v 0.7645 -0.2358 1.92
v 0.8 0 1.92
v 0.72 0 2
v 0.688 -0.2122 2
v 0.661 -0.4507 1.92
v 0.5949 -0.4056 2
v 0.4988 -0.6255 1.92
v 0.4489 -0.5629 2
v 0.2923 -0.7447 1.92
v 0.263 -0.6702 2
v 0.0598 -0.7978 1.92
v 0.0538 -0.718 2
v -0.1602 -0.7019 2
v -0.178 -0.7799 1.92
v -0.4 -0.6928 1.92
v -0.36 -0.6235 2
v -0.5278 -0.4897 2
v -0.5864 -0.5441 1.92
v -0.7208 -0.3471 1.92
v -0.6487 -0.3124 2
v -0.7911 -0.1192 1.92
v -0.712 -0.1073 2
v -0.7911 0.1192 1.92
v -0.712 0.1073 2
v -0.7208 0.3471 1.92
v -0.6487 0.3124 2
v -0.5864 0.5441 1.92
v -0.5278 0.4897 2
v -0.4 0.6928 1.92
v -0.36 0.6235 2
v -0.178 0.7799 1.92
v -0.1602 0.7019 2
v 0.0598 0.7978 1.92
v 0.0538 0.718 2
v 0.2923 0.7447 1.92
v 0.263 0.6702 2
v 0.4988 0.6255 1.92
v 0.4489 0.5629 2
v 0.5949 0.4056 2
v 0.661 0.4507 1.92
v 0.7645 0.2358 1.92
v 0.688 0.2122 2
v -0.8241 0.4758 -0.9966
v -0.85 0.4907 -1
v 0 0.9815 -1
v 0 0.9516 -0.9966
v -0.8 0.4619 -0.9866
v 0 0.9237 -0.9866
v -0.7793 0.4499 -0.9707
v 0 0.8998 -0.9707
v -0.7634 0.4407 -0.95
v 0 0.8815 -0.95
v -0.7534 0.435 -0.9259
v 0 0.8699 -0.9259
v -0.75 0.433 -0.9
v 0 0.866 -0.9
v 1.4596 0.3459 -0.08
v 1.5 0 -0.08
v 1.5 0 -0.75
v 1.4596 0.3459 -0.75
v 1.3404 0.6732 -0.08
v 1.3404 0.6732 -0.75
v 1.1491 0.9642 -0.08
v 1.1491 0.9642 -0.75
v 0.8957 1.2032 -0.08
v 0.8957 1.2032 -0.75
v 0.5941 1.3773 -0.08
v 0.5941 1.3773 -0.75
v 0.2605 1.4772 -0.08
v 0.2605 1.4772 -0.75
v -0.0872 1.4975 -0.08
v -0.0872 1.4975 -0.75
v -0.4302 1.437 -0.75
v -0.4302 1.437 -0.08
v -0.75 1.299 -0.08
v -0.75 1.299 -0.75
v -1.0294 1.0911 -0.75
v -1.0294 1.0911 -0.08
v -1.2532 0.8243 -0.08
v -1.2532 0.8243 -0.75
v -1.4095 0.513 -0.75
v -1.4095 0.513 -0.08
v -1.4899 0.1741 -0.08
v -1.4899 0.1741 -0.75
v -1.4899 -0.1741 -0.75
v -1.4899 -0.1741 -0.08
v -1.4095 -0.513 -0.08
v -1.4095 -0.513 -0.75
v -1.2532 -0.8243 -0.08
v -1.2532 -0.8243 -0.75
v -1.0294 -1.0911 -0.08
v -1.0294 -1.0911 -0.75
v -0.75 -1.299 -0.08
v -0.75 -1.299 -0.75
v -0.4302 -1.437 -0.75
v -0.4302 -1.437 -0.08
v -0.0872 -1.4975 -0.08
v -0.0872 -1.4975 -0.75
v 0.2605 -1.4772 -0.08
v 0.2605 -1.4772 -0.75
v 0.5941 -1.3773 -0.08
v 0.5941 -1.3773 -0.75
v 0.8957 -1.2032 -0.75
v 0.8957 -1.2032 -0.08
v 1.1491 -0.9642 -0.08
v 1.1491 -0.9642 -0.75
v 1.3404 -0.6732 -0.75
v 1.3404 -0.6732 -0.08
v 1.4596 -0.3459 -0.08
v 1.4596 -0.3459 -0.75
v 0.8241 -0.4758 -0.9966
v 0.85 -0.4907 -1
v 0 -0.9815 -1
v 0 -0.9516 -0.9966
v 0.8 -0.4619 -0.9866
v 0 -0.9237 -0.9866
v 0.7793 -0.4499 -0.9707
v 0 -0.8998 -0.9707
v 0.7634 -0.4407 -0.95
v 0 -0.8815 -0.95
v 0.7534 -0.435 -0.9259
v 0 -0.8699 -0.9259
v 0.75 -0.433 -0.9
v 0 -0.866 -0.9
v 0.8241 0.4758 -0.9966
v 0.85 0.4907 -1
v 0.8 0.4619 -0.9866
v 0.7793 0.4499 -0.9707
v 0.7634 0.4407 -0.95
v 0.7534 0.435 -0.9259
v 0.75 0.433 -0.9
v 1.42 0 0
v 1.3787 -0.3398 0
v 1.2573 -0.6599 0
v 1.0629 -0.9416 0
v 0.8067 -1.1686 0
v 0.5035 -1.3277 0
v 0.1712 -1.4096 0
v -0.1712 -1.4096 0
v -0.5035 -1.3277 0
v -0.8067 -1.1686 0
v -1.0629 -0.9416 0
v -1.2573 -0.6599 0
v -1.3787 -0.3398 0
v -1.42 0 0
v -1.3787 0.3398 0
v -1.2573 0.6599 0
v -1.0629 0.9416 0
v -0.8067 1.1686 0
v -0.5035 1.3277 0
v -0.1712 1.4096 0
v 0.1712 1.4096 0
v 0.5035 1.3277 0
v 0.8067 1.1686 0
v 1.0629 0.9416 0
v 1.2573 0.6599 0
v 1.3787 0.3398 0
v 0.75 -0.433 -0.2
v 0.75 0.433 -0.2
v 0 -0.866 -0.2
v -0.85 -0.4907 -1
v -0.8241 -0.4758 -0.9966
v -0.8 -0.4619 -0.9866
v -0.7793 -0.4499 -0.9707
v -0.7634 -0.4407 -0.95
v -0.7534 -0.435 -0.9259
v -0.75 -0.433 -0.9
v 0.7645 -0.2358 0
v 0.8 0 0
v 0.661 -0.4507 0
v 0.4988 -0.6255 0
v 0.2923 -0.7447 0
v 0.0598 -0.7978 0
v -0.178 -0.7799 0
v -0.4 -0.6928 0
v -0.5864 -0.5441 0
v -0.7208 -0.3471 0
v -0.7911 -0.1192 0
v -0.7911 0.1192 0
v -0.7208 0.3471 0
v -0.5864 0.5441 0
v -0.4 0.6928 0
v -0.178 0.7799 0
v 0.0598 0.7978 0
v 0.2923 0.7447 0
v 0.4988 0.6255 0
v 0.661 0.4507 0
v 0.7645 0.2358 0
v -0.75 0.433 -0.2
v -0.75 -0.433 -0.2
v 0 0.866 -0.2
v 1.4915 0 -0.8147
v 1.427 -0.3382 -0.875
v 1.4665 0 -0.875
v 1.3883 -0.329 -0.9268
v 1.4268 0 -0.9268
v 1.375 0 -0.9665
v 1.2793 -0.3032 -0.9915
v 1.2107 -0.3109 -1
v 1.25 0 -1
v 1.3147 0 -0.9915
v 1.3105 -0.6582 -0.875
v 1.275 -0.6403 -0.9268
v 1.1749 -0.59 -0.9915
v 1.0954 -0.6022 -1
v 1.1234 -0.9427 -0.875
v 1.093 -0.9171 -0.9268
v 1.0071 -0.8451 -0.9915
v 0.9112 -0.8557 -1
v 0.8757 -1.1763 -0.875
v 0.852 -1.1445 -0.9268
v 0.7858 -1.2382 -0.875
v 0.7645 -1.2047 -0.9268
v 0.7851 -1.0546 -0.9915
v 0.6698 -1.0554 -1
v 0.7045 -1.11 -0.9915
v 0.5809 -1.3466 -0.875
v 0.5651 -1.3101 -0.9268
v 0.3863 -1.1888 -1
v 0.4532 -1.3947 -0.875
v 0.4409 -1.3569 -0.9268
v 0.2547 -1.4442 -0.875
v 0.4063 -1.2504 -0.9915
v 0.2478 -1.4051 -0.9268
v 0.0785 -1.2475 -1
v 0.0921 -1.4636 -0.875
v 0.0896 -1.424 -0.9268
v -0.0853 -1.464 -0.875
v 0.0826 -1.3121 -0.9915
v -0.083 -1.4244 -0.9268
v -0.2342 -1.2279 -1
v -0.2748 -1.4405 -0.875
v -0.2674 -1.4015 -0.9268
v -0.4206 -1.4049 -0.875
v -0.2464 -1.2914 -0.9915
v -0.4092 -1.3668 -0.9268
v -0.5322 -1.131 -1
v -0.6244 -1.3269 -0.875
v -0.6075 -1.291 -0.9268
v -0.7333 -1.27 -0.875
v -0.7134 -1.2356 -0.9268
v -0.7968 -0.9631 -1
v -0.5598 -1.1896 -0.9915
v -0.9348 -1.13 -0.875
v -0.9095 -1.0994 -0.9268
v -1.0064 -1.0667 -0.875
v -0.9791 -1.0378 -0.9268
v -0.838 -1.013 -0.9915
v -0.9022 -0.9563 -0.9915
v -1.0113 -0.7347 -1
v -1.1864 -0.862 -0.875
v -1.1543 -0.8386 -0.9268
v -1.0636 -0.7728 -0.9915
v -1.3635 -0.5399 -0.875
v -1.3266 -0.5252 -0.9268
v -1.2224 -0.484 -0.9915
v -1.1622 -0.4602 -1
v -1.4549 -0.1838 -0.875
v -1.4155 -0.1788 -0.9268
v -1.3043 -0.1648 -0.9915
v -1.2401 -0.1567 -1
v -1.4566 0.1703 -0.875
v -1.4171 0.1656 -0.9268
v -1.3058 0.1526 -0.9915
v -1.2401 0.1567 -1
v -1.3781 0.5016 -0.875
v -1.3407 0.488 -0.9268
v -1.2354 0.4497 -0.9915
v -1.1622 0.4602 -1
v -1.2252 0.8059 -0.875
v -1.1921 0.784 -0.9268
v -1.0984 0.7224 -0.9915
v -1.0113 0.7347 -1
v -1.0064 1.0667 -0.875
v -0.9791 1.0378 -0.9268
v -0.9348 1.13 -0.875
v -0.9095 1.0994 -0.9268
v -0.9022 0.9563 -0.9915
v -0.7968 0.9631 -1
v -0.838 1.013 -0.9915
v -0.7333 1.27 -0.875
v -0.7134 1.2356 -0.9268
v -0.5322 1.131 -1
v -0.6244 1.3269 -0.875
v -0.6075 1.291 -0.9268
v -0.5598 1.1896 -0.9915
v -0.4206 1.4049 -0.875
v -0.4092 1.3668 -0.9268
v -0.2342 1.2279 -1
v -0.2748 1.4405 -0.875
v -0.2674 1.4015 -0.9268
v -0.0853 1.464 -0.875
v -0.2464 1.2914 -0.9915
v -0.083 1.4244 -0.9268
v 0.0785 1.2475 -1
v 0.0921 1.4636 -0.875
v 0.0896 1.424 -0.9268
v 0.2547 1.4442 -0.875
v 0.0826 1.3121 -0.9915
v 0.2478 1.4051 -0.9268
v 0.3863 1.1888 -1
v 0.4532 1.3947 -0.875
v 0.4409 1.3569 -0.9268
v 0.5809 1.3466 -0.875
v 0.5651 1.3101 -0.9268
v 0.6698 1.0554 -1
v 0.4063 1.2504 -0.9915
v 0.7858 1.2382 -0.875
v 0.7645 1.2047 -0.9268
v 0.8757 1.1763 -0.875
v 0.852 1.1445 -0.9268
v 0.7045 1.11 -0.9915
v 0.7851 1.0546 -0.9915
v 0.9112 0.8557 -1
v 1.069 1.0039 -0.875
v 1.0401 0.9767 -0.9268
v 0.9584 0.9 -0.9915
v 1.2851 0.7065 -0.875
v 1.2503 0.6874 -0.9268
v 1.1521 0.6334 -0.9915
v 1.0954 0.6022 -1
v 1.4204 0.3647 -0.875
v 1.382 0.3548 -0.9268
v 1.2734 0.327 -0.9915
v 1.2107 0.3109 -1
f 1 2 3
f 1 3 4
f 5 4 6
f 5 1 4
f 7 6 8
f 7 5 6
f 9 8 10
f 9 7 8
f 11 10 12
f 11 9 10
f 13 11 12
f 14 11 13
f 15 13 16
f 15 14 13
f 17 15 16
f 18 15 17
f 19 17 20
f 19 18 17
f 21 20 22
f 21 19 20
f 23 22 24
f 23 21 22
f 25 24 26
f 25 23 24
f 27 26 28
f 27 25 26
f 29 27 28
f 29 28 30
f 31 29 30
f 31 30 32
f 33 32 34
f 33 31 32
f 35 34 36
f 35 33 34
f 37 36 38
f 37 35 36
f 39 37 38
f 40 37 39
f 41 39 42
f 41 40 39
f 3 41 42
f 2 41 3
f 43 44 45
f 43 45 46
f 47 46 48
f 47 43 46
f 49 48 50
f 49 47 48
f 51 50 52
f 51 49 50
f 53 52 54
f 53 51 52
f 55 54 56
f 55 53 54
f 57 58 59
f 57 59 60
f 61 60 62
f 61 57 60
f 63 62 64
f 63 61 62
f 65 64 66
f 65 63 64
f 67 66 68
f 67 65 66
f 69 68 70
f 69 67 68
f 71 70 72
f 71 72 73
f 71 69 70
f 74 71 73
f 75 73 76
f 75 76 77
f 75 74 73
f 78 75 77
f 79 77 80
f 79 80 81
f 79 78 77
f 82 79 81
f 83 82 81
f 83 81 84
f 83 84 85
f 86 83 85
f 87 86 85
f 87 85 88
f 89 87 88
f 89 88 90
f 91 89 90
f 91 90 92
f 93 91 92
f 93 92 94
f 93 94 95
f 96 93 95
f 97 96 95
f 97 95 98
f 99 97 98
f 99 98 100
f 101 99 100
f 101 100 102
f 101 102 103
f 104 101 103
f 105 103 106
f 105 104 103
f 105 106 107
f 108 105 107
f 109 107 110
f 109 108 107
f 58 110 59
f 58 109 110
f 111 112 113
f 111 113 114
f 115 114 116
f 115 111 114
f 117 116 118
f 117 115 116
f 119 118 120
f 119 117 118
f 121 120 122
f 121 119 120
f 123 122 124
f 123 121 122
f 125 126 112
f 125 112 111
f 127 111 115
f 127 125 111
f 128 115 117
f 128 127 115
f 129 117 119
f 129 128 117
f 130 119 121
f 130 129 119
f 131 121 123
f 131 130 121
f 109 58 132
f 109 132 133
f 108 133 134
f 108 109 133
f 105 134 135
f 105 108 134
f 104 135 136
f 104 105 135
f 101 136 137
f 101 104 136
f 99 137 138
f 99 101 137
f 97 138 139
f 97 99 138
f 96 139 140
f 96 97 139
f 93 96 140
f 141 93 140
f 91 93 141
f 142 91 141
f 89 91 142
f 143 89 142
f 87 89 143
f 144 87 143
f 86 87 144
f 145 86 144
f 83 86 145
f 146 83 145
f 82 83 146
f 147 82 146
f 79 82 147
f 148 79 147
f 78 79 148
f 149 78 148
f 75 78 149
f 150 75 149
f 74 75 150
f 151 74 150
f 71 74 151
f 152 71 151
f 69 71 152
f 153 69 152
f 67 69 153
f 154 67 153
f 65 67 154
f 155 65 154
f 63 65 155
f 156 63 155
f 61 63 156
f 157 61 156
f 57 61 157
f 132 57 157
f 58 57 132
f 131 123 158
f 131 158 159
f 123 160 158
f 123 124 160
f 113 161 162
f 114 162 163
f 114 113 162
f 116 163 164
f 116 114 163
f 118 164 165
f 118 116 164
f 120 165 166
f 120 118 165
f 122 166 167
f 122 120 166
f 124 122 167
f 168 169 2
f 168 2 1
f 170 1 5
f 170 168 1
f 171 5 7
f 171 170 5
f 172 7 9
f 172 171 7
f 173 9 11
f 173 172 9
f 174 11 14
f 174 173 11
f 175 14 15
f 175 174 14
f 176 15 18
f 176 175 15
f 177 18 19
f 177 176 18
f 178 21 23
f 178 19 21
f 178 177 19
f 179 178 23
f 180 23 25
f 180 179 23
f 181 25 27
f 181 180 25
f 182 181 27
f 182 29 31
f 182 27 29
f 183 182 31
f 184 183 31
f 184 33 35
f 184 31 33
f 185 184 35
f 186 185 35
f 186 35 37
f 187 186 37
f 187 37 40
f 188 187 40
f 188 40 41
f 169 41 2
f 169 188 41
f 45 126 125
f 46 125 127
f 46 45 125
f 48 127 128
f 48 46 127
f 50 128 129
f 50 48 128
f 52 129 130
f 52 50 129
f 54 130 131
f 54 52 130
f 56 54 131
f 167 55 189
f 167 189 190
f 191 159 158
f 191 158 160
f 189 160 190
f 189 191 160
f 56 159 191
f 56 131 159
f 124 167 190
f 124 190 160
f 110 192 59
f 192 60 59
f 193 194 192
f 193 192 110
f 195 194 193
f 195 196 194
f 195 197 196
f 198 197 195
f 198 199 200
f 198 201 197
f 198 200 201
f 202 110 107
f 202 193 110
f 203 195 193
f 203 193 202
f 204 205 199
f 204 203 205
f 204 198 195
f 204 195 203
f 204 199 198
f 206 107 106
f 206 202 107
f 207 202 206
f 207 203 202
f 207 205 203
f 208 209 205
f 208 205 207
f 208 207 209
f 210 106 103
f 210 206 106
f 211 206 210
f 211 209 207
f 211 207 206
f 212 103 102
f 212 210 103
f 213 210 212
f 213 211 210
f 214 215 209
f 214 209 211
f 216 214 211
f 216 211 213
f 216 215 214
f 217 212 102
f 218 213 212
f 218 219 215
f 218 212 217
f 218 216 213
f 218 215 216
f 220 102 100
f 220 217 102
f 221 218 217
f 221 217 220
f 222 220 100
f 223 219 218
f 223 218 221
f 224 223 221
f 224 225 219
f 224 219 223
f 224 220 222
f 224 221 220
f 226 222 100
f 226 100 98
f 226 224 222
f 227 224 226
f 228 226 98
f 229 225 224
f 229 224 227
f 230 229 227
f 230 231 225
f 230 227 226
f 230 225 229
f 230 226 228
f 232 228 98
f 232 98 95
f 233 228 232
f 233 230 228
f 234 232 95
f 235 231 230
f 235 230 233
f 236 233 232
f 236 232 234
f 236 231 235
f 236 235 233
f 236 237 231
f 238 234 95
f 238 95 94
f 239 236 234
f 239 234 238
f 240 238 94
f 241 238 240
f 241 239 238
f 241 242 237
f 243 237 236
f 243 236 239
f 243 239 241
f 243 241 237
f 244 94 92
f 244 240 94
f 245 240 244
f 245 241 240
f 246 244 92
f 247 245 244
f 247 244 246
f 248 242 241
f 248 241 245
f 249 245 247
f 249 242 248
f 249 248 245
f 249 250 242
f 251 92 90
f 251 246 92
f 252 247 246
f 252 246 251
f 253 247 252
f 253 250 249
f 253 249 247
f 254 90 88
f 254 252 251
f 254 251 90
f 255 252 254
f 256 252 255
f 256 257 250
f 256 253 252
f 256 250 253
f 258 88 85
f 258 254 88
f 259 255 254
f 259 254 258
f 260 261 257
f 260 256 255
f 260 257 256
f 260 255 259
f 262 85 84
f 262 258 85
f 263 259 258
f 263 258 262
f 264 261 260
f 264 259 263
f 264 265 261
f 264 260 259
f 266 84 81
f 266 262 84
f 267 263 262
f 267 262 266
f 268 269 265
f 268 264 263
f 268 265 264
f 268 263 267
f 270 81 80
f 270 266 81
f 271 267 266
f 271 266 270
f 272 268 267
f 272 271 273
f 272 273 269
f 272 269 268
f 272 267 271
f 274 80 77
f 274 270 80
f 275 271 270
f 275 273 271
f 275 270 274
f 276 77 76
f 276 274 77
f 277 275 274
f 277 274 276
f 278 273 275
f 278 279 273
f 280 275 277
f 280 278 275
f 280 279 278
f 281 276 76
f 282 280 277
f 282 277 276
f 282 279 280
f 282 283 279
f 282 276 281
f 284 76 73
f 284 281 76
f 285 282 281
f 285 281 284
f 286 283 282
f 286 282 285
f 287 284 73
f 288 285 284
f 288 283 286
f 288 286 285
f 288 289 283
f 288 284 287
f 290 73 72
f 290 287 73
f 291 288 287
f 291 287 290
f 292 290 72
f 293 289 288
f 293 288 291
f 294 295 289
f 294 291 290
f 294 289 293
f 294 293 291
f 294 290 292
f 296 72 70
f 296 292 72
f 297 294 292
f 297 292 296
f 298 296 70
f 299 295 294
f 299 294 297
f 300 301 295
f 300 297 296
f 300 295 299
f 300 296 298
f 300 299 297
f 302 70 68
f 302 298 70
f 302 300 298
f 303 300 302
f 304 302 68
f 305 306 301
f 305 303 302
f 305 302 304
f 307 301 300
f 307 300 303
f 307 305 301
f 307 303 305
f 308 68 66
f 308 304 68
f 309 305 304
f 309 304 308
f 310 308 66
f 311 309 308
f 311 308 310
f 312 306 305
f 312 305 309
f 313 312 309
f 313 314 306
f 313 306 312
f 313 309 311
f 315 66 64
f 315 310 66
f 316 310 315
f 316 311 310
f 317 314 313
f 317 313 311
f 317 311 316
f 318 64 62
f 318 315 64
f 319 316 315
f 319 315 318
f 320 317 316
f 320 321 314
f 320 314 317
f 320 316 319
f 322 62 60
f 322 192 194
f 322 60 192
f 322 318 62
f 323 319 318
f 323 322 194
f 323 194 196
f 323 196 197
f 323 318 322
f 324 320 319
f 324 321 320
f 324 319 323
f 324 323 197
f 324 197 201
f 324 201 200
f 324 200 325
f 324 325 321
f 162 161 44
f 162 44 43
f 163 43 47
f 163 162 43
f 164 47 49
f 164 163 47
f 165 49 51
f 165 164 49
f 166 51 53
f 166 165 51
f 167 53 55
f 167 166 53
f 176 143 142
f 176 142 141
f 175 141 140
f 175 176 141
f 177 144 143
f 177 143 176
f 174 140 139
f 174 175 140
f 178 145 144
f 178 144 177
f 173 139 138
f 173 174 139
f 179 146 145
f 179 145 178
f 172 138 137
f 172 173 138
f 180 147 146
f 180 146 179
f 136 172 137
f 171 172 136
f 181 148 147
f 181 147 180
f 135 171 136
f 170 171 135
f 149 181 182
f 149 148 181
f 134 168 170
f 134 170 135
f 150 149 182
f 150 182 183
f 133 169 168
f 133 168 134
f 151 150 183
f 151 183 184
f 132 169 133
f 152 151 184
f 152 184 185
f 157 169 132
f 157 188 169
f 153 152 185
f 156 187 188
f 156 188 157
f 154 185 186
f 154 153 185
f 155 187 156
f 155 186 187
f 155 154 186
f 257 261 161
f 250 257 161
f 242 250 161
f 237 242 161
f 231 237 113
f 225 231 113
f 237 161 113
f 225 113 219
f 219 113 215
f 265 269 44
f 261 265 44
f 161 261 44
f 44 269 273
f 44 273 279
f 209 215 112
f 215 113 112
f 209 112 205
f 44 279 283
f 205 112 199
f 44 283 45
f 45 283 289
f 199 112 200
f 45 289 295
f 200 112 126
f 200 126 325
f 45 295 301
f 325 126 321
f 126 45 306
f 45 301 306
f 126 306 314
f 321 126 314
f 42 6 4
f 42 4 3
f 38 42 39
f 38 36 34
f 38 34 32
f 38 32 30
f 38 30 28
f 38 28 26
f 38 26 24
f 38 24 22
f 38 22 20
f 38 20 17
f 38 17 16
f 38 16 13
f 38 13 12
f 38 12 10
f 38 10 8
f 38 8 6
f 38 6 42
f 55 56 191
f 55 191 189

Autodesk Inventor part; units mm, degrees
ref_plane "YZ Plane" through (0, 0, 0) normal (1, 0, 0) x (0, 1, 0)
ref_plane "XZ Plane" through (0, 0, 0) normal (0, 1, 0) x (-1, 0, 0)
ref_plane "XY Plane" through (0, 0, 0) normal (0, 0, 1) x (1, 0, 0)
sketch "Sketch1" plane through (0, 0, 0) normal (0, 0, 1) x (1, 0, 0)
  circle A0 centre (0, 0) radius 0.8
  circle A1 centre (0, 0) radius 1.5
  dimension "d0" = 1.6
  dimension "d1" = 3
extrude "Extrusion1" add sketch "Sketch1" along normal blind 2 contours A0
extrude "Extrusion2" add sketch "Sketch1" against normal blind 1 contours A0 | A1
sketch "Sketch2" plane through (0, 0, -1) normal (0, 0, -1) x (-1, 0, 0)
  line L0 (-0.75, 0.433) -> (0, 0.866)
  line L1 (0, 0.866) -> (0.75, 0.433)
  line L2 (0.75, 0.433) -> (0.75, -0.433)
  line L3 (0.75, -0.433) -> (0, -0.866)
  line L4 (0, -0.866) -> (-0.75, -0.433)
  line L5 (-0.75, -0.433) -> (-0.75, 0.433)
  point P0 (0, 0)
  point P1 (0, 0)
  dimension "d6" = 1.5
extrude "Extrusion3" cut sketch "Sketch2" against normal blind 0.8
fillet "Fillet1" radius 0.25 1 edges at (-1.5, 0, -1)
fillet "Fillet1" radius 0.1 6 edges at (0.375, 0.6495, -1) (0.75, 0, -1) (0.375, -0.6495, -1) (-0.375, -0.6495, -1) (-0.75, 0, -1) (-0.375, 0.6495, -1)
thread "Thread1" size "M1.6x0.35" class "6g" standard "ANSI Metric M Profile" full length
chamfer "Chamfer1" distance 0.08 angle 45 2 edges at (-0.8, 0, 2) (-1.5, 0, 0)
properties part number "CNCT_STEEL_M1,6x2_Screw" material "Stainless Steel"
